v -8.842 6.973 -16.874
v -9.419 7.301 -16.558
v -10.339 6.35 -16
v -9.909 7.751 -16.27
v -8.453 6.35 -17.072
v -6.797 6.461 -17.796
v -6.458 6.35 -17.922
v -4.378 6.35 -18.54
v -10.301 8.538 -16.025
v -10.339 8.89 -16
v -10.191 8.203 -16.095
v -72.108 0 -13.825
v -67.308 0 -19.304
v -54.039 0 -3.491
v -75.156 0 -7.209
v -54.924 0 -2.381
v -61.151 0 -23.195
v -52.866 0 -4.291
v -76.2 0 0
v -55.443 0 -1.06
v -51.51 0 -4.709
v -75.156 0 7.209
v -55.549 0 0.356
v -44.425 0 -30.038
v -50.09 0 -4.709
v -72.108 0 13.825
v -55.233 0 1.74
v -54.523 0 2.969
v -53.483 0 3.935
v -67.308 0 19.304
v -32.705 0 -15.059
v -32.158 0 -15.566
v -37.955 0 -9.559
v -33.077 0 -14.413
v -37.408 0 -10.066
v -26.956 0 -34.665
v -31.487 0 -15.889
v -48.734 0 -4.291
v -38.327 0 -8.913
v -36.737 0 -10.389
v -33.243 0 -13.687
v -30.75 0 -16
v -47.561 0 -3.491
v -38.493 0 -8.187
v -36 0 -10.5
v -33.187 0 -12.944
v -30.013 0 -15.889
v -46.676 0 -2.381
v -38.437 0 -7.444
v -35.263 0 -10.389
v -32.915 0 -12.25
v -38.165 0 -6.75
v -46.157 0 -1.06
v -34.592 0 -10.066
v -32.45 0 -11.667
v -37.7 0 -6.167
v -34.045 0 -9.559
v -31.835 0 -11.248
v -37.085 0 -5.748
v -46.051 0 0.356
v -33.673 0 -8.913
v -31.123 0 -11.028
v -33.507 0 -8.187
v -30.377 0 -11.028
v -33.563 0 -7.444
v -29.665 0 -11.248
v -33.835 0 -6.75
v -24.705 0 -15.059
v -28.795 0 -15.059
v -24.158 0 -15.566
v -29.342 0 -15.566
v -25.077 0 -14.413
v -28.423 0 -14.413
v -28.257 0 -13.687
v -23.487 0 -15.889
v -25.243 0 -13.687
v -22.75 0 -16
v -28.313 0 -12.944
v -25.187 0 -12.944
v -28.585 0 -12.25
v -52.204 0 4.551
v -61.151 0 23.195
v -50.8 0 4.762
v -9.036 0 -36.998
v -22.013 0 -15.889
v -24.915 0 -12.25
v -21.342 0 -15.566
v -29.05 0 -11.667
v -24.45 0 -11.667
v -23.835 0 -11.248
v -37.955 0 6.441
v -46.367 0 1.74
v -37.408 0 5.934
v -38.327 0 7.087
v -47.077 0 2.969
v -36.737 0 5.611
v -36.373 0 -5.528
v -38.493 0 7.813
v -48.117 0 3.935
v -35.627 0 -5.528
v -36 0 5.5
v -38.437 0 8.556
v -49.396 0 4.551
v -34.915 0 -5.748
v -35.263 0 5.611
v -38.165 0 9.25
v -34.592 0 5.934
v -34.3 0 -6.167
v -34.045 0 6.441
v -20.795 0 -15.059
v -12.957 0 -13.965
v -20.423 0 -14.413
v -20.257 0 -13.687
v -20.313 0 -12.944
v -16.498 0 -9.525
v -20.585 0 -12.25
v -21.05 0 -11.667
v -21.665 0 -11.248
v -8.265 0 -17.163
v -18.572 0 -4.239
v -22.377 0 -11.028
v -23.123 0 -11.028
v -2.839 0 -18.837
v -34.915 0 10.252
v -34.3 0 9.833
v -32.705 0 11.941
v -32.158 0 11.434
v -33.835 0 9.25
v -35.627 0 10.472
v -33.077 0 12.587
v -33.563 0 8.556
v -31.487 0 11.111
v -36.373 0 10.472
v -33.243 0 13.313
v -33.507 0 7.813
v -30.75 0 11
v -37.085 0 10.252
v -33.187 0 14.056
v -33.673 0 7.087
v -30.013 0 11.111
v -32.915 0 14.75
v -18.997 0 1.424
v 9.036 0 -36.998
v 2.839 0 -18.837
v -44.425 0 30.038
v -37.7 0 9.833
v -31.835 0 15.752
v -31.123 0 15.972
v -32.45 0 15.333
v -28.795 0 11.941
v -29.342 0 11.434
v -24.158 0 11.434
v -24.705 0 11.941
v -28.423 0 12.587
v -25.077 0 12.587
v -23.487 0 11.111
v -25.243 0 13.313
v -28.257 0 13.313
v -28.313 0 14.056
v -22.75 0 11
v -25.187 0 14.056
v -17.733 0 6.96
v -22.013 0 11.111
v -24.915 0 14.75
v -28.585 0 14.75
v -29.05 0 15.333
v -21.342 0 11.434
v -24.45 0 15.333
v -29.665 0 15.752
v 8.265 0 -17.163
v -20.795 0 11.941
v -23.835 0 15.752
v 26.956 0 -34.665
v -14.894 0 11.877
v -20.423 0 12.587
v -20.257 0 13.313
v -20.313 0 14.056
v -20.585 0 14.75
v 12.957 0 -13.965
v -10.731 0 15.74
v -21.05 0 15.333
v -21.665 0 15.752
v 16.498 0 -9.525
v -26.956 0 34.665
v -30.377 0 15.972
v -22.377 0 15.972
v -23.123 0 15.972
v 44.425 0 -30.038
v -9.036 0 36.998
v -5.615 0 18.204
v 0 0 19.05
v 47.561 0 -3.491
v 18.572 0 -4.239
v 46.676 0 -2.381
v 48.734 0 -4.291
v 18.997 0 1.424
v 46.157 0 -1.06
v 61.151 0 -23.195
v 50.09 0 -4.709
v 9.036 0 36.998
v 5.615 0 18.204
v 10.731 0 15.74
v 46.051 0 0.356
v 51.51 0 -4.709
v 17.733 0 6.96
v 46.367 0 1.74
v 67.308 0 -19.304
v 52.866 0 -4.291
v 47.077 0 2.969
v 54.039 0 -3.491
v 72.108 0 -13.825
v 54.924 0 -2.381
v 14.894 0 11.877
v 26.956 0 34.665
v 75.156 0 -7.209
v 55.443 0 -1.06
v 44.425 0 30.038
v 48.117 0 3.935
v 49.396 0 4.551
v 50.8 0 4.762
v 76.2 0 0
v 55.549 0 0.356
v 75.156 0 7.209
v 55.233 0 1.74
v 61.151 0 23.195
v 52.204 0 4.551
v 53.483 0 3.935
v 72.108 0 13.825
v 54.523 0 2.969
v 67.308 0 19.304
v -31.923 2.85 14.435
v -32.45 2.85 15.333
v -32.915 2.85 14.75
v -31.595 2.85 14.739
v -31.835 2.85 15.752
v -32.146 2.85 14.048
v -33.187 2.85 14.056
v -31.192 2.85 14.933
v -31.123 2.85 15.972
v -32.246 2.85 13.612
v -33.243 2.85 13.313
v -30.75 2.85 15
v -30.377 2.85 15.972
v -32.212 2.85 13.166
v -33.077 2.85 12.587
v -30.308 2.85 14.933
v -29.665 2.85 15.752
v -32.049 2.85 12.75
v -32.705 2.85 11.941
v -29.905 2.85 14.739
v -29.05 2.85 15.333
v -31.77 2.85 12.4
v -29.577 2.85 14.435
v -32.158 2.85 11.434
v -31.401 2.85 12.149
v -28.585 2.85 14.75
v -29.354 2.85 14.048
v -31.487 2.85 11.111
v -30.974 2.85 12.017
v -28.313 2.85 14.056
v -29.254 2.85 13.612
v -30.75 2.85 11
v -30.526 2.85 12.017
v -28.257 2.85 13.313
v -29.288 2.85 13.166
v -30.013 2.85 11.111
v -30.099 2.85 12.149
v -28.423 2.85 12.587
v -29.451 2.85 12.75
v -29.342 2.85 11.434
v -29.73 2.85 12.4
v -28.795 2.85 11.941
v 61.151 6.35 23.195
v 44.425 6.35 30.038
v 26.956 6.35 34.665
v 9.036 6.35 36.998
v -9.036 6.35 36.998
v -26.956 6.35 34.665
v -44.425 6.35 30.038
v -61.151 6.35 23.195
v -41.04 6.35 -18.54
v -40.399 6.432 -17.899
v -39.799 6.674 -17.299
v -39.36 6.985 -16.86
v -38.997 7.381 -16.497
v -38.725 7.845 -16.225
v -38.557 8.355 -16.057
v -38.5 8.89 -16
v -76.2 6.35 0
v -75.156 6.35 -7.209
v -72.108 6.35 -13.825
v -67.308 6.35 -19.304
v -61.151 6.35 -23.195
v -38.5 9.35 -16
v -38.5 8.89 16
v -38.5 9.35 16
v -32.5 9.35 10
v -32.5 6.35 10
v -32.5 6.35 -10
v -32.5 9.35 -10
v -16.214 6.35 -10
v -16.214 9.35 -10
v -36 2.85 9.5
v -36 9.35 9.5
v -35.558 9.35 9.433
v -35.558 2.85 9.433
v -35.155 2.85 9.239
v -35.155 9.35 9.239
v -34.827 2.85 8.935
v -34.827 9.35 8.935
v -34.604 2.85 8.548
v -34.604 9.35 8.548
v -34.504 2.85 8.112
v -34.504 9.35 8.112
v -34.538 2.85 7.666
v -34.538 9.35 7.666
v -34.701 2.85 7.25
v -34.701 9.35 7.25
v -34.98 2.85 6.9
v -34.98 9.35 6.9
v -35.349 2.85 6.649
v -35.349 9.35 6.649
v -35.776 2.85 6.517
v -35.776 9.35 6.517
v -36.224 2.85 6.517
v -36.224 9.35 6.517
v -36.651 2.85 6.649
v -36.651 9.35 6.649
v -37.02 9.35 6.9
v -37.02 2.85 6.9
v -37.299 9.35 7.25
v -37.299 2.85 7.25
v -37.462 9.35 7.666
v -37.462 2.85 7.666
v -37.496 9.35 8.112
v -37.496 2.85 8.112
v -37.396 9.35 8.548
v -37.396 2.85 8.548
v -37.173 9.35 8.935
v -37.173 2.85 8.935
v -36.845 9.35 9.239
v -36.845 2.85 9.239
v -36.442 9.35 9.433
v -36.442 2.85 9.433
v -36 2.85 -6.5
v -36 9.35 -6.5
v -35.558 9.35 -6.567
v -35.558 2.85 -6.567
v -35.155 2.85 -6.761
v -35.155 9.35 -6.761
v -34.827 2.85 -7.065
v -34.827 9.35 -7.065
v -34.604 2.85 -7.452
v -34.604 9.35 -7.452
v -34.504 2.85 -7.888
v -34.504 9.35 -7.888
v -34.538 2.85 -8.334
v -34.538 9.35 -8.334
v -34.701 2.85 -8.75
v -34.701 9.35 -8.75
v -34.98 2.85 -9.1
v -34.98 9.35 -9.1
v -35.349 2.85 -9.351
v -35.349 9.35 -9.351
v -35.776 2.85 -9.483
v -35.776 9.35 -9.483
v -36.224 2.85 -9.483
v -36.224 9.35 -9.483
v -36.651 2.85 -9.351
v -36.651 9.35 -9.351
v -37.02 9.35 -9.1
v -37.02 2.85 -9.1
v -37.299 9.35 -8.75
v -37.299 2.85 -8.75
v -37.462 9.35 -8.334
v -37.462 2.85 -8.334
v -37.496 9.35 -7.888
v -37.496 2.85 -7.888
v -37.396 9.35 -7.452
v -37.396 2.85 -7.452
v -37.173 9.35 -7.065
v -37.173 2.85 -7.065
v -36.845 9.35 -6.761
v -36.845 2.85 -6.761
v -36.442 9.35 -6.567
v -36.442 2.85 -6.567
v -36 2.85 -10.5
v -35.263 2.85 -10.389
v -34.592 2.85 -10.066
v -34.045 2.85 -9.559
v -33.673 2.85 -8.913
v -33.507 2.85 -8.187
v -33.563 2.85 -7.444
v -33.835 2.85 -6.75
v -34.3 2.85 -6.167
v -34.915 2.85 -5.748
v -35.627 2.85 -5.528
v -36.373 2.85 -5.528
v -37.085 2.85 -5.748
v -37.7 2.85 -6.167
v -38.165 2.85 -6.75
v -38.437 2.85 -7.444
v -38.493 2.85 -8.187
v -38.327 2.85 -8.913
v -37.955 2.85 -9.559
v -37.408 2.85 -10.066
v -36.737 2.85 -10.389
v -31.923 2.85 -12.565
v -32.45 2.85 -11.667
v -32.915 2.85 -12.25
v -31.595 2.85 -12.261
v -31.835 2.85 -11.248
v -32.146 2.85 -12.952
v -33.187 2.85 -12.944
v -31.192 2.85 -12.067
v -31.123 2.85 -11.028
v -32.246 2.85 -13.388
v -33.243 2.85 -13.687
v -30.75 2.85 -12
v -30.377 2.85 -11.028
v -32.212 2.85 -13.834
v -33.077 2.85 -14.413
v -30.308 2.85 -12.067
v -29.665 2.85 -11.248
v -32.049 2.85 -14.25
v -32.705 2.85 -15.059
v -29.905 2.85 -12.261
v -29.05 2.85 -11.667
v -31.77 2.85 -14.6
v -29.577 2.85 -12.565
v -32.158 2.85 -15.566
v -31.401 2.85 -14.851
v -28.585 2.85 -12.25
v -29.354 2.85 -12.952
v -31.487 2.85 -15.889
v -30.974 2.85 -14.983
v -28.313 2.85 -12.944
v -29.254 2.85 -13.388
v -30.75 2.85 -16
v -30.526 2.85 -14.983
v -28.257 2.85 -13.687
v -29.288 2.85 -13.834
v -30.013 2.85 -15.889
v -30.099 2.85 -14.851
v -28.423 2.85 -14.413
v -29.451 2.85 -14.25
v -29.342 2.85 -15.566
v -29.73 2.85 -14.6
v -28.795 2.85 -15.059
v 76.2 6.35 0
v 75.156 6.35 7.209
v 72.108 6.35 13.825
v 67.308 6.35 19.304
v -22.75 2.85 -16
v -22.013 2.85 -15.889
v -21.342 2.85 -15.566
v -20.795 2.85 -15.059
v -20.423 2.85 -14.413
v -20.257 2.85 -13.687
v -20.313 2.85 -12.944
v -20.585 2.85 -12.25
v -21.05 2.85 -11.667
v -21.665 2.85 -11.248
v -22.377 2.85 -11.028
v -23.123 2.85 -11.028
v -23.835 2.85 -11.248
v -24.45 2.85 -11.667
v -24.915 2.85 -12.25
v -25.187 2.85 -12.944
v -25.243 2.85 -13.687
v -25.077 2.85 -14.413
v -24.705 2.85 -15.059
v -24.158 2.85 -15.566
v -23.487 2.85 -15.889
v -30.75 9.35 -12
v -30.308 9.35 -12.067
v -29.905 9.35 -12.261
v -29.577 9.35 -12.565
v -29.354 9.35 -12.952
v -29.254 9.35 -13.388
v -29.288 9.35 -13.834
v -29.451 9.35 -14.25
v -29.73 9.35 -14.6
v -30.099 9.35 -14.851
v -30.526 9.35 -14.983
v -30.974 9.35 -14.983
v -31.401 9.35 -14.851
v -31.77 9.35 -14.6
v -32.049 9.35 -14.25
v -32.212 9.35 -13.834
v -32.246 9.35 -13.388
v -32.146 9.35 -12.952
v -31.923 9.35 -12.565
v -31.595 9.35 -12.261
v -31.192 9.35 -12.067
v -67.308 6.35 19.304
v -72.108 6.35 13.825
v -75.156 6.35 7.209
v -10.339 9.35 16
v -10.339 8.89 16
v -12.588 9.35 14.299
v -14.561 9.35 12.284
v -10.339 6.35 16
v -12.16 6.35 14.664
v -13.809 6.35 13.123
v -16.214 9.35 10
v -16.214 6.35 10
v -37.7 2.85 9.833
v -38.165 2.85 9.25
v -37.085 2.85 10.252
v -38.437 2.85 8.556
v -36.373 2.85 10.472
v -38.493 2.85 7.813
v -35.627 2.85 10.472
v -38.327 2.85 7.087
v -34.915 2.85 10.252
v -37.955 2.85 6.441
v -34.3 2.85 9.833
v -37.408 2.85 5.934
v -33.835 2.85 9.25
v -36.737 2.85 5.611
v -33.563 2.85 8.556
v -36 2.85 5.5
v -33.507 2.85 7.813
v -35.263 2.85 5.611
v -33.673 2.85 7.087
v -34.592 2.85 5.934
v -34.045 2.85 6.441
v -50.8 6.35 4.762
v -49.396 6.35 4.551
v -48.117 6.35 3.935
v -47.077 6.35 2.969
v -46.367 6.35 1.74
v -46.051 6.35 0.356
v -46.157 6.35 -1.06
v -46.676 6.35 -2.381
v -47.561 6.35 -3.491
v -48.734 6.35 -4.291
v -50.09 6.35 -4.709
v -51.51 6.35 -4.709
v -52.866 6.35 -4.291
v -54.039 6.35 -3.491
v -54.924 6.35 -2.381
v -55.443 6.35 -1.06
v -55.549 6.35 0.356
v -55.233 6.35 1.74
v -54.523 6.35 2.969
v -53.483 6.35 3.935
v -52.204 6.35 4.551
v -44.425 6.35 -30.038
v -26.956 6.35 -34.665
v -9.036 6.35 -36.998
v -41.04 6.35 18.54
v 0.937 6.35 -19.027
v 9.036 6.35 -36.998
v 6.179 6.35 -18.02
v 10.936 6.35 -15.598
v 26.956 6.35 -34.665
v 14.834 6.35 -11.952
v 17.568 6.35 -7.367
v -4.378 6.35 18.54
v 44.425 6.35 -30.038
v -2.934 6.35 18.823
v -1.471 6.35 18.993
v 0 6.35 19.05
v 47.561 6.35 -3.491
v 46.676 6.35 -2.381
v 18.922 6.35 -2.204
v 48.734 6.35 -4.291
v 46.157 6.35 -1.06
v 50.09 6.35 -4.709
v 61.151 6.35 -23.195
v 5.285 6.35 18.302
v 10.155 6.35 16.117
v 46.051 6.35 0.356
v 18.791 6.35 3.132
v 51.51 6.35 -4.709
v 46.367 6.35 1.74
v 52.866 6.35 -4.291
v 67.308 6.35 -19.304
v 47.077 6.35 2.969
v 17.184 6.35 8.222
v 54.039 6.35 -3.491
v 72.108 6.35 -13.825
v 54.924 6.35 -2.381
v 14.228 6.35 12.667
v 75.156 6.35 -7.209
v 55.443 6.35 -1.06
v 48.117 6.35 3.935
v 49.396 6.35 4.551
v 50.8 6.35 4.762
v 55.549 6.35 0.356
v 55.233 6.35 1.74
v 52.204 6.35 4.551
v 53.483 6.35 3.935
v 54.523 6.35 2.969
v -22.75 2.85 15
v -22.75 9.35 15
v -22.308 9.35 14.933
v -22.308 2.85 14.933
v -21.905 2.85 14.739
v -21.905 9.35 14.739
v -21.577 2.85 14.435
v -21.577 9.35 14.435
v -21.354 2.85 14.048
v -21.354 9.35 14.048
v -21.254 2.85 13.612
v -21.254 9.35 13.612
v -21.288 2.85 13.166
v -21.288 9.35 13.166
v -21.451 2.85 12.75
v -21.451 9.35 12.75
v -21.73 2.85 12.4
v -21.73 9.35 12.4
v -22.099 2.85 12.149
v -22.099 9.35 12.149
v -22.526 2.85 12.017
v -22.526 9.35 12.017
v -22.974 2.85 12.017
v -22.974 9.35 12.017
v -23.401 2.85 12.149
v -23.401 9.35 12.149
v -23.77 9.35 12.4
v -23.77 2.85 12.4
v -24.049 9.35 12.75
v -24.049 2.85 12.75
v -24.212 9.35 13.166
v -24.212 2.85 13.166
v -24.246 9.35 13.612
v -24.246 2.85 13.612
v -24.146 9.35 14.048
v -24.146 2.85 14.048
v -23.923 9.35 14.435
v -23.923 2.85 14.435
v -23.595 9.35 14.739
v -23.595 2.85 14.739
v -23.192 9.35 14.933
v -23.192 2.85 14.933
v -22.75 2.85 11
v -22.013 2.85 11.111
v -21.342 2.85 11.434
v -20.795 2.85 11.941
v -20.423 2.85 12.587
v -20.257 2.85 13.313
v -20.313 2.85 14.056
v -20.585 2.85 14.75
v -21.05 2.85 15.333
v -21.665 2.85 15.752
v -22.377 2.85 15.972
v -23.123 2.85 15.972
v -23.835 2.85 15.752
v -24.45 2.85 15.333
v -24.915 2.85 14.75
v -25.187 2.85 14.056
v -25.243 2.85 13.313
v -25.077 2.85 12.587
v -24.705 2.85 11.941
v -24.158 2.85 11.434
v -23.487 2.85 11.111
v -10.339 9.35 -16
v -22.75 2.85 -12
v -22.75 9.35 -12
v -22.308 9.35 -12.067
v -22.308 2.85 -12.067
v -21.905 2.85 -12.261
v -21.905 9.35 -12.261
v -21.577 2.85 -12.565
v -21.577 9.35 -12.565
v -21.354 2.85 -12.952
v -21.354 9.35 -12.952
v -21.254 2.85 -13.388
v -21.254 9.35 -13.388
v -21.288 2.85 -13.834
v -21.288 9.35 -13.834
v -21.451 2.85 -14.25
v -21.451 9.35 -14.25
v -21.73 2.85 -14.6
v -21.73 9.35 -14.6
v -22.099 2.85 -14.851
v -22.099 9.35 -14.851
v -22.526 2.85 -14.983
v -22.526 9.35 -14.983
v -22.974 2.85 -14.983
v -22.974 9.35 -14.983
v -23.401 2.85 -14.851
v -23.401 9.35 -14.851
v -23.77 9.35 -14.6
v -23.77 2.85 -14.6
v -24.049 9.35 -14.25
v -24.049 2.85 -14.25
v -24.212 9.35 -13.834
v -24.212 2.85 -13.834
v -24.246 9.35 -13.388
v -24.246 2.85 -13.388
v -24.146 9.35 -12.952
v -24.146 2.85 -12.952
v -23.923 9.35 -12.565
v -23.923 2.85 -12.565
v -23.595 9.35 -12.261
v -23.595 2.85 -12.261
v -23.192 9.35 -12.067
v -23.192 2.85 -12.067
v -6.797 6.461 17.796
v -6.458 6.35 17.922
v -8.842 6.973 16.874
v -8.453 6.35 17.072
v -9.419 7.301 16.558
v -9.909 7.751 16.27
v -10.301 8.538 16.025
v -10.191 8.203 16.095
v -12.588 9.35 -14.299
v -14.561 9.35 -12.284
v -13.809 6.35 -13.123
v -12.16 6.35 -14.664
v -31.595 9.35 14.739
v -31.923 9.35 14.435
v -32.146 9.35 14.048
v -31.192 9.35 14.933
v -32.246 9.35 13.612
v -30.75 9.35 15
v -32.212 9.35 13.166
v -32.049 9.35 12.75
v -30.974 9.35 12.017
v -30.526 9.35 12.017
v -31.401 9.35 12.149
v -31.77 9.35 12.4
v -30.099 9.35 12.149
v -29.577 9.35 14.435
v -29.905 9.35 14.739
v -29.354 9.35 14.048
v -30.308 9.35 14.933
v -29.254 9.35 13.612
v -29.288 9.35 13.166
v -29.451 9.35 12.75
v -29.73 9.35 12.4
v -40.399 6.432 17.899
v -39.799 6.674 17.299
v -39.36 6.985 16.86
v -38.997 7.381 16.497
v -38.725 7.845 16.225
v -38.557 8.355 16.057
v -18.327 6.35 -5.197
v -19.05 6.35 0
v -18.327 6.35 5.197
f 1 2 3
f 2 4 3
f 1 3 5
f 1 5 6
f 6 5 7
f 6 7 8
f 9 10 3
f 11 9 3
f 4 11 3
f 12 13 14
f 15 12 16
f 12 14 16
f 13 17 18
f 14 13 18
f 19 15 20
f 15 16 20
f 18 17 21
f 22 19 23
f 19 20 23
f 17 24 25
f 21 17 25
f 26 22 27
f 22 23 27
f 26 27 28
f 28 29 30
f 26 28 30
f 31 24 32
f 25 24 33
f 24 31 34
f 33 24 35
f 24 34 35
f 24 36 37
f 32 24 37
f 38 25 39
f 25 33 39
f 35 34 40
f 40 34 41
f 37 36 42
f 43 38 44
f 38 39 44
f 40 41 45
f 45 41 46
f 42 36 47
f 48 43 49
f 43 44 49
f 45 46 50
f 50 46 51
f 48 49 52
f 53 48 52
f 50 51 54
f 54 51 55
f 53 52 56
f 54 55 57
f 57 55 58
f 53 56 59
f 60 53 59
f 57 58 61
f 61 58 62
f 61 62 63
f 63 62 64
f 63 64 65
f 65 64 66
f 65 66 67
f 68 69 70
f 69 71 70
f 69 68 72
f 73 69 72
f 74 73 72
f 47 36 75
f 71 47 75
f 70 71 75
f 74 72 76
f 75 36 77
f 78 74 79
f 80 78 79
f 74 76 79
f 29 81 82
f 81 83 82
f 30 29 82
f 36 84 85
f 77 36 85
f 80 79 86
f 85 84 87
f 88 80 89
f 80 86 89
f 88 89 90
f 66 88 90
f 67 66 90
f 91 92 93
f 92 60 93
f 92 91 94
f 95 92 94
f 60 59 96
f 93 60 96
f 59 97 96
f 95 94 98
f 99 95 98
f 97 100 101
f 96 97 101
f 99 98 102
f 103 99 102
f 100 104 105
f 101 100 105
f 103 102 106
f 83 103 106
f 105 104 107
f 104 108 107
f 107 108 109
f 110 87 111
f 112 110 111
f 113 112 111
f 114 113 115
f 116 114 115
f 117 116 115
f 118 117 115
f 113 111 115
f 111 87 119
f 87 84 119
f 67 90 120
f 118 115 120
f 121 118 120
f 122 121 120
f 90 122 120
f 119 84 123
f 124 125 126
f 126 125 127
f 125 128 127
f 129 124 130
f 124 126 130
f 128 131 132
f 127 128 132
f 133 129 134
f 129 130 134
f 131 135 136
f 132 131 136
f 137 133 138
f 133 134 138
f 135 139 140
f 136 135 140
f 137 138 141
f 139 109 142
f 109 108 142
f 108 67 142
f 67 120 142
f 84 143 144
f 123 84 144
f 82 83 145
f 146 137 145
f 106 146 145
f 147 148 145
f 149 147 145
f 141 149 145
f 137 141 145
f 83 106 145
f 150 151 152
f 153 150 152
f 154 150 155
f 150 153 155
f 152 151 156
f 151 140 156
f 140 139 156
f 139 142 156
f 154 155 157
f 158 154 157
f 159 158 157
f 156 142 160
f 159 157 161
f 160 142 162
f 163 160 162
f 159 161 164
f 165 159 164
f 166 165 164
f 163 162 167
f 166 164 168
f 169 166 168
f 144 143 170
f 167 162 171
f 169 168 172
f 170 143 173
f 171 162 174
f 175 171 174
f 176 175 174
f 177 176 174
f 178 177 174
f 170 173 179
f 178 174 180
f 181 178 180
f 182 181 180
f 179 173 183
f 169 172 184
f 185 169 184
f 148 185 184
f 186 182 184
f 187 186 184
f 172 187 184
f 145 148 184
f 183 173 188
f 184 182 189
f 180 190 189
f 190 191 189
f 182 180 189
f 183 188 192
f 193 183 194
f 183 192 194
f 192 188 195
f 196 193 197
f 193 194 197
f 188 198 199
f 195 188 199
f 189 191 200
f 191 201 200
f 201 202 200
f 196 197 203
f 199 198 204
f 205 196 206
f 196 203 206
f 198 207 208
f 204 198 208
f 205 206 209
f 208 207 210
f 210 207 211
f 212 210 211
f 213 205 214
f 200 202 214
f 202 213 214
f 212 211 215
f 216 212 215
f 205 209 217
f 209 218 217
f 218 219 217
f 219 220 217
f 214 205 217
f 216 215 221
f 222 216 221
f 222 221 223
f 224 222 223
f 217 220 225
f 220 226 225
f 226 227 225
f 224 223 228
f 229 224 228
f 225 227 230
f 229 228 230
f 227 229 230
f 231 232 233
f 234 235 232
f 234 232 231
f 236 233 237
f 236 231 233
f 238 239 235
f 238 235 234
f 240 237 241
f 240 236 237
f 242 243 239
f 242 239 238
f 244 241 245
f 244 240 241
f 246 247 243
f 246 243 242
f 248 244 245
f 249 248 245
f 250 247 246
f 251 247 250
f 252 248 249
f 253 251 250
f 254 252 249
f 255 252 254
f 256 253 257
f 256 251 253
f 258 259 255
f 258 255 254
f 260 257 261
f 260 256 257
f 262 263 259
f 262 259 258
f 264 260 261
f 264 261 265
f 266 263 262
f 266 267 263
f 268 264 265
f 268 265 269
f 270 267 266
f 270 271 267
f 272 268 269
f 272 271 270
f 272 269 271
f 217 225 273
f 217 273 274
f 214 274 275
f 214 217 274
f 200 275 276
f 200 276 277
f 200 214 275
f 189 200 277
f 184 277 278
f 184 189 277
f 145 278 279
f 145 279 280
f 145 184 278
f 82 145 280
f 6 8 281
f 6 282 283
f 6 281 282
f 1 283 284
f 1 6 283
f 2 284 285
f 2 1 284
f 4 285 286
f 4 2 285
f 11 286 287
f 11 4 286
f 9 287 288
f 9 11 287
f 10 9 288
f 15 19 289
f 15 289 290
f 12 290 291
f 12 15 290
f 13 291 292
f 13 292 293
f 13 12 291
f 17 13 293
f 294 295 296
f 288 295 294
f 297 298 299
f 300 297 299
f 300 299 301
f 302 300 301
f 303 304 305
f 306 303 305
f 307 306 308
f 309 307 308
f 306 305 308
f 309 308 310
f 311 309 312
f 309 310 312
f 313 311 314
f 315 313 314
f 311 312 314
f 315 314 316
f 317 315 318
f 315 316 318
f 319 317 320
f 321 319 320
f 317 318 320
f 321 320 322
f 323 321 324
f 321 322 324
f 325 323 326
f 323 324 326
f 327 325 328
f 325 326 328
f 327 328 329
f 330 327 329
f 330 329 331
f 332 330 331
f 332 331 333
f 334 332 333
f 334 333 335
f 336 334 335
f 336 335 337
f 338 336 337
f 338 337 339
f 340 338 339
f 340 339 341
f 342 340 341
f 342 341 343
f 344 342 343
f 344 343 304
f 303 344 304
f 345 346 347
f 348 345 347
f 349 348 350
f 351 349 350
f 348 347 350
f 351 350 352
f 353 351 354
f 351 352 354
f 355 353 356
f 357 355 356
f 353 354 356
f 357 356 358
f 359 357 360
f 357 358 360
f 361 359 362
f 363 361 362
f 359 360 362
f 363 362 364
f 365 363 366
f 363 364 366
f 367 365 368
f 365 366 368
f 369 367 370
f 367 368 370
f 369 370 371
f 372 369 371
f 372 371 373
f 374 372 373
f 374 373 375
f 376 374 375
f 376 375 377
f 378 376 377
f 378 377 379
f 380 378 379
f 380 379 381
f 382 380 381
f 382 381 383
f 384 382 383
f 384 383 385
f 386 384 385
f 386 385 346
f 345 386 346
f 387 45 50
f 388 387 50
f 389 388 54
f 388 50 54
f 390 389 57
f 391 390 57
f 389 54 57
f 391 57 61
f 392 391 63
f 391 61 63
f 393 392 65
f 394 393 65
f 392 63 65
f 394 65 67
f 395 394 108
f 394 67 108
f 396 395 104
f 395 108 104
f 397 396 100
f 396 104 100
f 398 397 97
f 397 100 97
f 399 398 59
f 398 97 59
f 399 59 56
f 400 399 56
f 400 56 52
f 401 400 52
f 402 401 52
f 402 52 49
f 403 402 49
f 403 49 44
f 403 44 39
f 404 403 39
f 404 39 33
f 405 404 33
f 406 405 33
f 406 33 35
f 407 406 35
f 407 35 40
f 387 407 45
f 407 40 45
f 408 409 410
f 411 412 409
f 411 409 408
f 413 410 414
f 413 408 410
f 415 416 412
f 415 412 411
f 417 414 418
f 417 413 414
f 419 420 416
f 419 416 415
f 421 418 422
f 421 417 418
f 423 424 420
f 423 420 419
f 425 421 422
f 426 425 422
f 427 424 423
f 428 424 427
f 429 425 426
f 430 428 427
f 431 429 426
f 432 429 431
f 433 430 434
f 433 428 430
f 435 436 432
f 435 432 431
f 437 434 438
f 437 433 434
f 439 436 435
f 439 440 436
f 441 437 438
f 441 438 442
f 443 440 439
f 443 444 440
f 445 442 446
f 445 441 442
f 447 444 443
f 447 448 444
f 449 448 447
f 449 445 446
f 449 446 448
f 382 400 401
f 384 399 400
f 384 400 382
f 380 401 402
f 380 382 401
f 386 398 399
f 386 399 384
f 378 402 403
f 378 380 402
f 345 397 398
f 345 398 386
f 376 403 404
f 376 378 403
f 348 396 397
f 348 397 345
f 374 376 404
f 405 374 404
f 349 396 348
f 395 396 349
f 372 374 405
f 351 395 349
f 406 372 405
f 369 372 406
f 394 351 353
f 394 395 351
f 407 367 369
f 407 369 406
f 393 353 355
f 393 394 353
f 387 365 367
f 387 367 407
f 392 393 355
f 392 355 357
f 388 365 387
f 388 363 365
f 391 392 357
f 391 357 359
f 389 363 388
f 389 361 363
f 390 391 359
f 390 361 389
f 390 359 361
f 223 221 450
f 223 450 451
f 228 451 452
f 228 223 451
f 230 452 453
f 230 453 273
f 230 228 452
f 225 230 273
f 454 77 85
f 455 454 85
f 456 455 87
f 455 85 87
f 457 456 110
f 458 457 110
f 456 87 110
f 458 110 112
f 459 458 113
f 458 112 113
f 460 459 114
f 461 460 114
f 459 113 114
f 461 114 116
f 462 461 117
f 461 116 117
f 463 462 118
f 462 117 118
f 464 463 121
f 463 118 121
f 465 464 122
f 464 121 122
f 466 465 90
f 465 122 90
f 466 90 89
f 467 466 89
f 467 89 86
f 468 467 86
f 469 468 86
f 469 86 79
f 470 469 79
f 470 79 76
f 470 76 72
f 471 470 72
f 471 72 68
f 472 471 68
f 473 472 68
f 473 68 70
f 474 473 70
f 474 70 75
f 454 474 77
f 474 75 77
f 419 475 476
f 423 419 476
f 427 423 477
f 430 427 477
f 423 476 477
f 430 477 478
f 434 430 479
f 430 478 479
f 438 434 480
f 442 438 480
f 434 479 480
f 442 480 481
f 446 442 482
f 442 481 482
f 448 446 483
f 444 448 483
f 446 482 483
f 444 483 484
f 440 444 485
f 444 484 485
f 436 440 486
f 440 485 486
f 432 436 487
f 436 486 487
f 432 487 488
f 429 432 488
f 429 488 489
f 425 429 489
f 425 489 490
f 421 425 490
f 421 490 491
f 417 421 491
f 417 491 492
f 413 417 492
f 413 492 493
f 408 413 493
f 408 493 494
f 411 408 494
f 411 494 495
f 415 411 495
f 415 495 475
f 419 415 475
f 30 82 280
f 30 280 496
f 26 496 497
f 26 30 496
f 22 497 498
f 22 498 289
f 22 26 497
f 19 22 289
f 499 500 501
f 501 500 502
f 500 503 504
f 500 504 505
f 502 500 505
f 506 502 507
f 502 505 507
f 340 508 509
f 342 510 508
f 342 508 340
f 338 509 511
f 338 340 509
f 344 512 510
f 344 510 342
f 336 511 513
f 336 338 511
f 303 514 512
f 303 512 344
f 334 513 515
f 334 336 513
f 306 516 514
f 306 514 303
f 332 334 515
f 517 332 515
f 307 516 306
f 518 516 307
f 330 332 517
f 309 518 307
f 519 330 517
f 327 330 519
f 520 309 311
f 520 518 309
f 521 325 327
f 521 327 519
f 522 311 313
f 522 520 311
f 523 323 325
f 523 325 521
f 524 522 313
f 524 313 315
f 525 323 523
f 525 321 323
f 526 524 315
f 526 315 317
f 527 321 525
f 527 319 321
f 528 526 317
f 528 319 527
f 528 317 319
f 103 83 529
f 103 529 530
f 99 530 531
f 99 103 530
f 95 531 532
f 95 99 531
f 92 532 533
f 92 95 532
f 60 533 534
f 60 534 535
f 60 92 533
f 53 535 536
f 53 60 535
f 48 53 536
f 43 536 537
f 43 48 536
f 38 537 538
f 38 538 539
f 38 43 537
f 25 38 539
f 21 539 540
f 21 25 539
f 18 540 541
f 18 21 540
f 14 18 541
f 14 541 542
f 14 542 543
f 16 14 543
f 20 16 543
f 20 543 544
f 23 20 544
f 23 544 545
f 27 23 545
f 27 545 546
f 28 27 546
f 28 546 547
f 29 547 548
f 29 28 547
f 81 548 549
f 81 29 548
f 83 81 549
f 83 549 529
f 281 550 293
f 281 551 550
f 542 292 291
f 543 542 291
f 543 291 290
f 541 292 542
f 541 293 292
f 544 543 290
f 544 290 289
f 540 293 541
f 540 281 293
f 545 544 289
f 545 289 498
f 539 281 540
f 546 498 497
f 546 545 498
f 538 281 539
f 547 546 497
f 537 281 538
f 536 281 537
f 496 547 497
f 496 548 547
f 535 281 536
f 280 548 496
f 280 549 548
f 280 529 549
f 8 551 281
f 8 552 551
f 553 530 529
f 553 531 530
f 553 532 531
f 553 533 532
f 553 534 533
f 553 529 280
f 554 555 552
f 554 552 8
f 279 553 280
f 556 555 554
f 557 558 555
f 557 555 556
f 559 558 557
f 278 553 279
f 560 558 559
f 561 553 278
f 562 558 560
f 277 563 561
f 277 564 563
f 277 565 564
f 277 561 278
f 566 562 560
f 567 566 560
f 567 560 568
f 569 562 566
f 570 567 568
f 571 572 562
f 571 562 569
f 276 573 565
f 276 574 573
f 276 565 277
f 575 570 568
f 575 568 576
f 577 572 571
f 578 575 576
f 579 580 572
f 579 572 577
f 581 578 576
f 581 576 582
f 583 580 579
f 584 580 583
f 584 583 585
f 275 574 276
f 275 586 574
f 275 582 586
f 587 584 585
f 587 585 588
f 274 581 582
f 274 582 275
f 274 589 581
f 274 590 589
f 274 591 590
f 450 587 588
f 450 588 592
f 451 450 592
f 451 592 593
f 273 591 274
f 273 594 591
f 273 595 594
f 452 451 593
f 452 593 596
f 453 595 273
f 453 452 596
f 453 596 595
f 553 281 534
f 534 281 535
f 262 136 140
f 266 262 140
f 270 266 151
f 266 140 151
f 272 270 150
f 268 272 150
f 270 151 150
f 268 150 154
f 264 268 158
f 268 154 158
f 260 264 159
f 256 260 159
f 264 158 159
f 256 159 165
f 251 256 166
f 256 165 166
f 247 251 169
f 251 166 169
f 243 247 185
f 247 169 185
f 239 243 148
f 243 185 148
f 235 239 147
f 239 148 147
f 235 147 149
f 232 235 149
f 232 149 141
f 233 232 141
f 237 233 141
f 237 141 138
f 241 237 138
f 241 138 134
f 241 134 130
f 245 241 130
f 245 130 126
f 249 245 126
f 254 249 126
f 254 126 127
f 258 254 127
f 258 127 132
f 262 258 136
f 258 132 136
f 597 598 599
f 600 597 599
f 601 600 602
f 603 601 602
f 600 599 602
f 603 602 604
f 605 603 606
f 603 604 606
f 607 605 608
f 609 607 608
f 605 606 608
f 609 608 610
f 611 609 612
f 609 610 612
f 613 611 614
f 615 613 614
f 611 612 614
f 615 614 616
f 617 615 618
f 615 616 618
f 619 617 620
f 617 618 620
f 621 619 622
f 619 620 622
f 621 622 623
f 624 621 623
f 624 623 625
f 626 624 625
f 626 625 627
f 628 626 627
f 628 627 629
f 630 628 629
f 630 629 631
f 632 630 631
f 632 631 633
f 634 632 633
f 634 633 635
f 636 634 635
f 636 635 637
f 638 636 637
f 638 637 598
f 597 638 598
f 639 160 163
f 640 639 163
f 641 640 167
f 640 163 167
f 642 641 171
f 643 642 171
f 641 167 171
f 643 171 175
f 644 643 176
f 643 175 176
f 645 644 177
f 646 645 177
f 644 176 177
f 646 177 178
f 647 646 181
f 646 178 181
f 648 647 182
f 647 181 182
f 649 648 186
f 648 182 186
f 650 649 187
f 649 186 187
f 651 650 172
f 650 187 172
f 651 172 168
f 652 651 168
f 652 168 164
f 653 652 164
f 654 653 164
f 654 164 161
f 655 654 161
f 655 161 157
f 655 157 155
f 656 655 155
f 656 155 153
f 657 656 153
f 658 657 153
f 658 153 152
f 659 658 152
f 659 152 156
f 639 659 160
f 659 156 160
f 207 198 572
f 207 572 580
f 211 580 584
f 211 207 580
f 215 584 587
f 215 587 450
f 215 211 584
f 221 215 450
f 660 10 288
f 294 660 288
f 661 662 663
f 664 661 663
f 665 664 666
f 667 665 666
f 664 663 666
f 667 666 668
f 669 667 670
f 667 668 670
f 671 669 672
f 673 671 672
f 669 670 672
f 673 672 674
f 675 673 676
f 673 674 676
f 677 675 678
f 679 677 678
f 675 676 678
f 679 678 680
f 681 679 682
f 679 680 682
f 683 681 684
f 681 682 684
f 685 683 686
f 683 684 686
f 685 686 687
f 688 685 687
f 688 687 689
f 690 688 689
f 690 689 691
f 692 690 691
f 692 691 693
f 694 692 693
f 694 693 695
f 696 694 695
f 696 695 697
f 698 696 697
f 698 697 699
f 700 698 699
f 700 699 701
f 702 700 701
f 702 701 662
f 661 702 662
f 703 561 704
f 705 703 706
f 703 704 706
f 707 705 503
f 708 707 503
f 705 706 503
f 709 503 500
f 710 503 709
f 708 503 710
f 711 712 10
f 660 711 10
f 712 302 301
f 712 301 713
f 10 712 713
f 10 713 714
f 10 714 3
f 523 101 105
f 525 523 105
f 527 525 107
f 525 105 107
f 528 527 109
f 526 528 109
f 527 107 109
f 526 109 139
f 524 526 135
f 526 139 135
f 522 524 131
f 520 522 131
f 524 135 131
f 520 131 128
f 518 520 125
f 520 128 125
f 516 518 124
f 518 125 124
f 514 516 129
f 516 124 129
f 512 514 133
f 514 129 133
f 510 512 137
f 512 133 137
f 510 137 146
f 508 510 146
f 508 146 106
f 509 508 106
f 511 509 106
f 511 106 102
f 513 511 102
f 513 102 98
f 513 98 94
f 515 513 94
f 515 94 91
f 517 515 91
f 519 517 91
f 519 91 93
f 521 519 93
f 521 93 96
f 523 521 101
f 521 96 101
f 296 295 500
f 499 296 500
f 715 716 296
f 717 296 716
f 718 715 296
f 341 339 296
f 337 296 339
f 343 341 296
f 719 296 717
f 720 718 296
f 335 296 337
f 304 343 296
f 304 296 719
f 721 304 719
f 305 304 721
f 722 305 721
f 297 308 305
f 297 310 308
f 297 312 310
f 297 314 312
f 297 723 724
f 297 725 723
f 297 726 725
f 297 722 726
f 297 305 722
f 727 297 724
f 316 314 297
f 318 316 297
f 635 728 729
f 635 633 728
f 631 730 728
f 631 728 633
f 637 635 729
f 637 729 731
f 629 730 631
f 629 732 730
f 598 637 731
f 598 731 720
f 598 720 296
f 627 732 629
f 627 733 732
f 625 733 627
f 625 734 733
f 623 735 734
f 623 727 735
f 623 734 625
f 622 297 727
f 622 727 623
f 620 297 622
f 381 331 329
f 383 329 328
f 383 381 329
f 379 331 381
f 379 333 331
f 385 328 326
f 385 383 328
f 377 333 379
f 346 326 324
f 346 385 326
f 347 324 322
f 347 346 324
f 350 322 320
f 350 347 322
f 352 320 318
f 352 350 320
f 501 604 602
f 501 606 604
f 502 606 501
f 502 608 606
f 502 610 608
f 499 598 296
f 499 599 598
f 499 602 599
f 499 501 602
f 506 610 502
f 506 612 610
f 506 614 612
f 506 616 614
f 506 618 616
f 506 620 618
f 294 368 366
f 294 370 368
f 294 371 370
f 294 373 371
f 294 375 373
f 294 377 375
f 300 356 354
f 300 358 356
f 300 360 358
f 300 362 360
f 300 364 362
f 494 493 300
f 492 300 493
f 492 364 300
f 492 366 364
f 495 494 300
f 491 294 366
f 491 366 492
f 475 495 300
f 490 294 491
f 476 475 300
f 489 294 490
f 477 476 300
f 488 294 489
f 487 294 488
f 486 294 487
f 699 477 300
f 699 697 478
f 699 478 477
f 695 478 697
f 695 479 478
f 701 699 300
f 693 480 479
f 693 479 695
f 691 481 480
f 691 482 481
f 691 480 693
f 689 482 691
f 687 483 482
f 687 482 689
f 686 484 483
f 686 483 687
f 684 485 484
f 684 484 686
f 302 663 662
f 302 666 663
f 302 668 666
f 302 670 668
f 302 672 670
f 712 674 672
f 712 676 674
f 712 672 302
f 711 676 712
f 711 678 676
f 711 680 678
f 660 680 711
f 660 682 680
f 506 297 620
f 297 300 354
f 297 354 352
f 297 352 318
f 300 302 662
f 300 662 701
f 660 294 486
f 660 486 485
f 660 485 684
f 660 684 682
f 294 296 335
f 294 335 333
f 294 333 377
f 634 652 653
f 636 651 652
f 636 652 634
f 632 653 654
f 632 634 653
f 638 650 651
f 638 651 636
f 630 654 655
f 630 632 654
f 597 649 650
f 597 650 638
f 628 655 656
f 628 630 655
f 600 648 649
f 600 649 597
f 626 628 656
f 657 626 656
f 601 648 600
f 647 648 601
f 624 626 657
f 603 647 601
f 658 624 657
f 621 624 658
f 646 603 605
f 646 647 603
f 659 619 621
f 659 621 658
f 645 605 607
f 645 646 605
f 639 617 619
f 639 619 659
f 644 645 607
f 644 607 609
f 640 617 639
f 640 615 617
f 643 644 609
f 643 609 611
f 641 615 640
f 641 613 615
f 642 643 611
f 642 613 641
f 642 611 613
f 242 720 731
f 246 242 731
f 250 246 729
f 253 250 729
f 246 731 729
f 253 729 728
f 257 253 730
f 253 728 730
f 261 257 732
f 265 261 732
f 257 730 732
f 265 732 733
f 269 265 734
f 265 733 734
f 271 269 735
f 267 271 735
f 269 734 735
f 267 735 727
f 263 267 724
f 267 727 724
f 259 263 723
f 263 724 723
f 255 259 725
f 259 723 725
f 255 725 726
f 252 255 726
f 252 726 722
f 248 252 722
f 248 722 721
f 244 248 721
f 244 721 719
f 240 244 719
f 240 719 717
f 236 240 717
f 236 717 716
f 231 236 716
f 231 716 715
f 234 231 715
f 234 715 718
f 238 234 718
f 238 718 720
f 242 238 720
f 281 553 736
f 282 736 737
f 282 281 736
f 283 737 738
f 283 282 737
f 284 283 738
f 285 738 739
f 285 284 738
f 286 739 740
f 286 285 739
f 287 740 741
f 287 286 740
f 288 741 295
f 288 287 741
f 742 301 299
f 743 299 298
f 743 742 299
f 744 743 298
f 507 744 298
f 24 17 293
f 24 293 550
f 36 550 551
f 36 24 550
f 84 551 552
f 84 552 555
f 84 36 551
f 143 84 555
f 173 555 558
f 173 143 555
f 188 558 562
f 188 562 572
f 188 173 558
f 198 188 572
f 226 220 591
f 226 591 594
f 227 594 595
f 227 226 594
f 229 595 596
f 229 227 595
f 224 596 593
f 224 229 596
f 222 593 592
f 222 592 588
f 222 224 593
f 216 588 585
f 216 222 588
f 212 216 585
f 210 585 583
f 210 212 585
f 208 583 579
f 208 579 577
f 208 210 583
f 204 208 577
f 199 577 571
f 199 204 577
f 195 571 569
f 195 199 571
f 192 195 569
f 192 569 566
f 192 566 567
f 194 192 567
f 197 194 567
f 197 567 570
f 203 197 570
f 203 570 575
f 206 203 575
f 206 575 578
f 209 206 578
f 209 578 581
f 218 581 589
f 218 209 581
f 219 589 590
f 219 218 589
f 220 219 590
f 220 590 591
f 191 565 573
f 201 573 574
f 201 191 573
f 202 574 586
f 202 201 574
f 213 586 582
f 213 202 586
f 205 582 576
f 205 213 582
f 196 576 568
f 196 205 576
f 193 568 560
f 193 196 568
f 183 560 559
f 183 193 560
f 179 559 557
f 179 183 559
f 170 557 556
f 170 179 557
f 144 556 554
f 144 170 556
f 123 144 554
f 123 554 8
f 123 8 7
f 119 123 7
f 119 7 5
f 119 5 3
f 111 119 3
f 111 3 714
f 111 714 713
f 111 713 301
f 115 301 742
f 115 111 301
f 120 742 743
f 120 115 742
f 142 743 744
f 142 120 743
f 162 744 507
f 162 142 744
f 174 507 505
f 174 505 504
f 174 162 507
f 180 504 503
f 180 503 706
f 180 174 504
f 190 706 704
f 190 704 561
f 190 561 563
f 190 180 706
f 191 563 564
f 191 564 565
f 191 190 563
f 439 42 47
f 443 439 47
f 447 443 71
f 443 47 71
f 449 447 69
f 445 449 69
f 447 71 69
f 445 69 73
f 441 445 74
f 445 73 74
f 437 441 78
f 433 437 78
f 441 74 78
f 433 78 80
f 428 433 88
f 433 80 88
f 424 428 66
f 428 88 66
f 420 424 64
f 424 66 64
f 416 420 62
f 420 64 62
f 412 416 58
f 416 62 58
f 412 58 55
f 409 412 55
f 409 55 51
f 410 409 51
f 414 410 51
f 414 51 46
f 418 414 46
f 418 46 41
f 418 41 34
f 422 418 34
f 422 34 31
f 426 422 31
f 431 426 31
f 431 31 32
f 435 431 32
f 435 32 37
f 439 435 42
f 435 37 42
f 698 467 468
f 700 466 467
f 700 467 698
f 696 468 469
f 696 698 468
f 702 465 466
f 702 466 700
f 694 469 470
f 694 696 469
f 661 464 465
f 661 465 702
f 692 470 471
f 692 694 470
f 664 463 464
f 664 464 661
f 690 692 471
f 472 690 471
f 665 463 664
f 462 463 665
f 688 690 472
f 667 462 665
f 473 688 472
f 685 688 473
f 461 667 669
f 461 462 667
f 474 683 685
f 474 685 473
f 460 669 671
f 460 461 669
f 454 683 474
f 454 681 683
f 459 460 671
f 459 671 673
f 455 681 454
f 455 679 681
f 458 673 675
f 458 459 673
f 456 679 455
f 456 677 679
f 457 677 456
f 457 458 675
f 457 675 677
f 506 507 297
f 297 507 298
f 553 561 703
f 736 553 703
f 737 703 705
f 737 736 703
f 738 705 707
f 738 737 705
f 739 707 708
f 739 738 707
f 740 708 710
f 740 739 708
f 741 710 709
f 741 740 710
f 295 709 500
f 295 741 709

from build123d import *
from build123d.topology import SkipClean

# Parameters (mm, degrees)
SKETCH1_R           = 76.2
BOSS_EXTRUDE1_DEPTH = 6.35
CUT_EXTRUDE2_START  = -6.35
SKETCH2_R           = 4.7625
SKETCH2_R_2         = 19.05
CUT_EXTRUDE2_DEPTH  = 6.35
BOSS_EXTRUDE2_DEPTH = 3
SKETCH4_R           = 1.5
SKETCH4_R_2         = 1.25
CUT_EXTRUDE3_DEPTH  = 86.348763
FILLET1_R           = 2.54
SKETCH5_R           = 2.5
CUT_EXTRUDE4_DEPTH  = 2.85


with BuildPart() as part:
    # Sketch1 → Boss-Extrude1 (new body)
    with BuildSketch(Plane(origin=(0, 0, 0), x_dir=(1, 0, 0), z_dir=(0, 1, 0))):
        with Locations(Location((0, 0, 0), (0, 0, 270))):
            Circle(SKETCH1_R)
    extrude(amount=BOSS_EXTRUDE1_DEPTH)

    # Sketch2 → Cut-Extrude2 (cut)
    with BuildSketch(Plane(origin=(0, 6.35, 0), x_dir=(1, 0, 0), z_dir=(0, 1, 0)).offset(CUT_EXTRUDE2_START)):
        with BuildLine():
            ThreePointArc((61.150771, -23.195291), (0, -37.290064), (-61.150771, -23.195291))
            ThreePointArc((-61.150771, -23.195291), (-72.108092, -13.824804), (-76.2, 0))
            ThreePointArc((-76.2, 0), (0, -76.2), (76.2, 0))
            ThreePointArc((76.2, 0), (72.108092, -13.824804), (61.150771, -23.195291))
        make_face()
        with BuildLine():
            ThreePointArc((-61.150771, 23.195291), (0, 37.290064), (61.150771, 23.195291))
            ThreePointArc((61.150771, 23.195291), (72.108092, 13.824804), (76.2, 0))
            ThreePointArc((76.2, 0), (0, 76.2), (-76.2, 0))
            ThreePointArc((-76.2, 0), (-72.108092, 13.824804), (-61.150771, 23.195291))
        make_face()
        with Locations(Location((-50.8, 0, 0), (0, 0, 270))):
            Circle(SKETCH2_R)
        with Locations(Location((50.8, 0, 0), (0, 0, 270))):
            Circle(SKETCH2_R)
        with Locations(Location((0, 0, 0), (0, 0, 270))):
            Circle(SKETCH2_R_2)
    extrude(amount=CUT_EXTRUDE2_DEPTH, mode=Mode.SUBTRACT)

    # Sketch3 → Boss-Extrude2 (add)
    with SkipClean():  # the faces are left unmerged after this step: merging them gives an invalid solid
        with BuildSketch(Plane(origin=(0, 6.35, 0), x_dir=(1, 0, 0), z_dir=(0, 1, 0))):
            with BuildLine():
                Line((-38.5, 4.75), (-38.5, -4.75))
                Line((-38.5, -4.75), (-38.5, -11.25))
                Line((-38.5, -11.25), (-38.5, -16))
                Line((-38.5, -16), (-18, -16))
                Line((-18, -16), (-11.5, -16))
                Line((-11.5, -16), (-10.339367, -16))
                ThreePointArc((-10.339367, -16), (-13.611535, -13.327739), (-16.214268, -10))
                Line((-16.214268, -10), (-31.096327, -10))
                Line((-31.096327, -10), (-32.5, -10))
                Line((-32.5, -10), (-32.5, -8.522949))
                Line((-32.5, -8.522949), (-32.5, 8.425596))
                Line((-32.5, 8.425596), (-32.5, 10))
                Line((-32.5, 10), (-31.027855, 10))
                Line((-31.027855, 10), (-16.214268, 10))
                ThreePointArc((-16.214268, 10), (-13.611535, 13.327739), (-10.339367, 16))
                Line((-10.339367, 16), (-11.5, 16))
                Line((-11.5, 16), (-18, 16))
                Line((-18, 16), (-38.5, 16))
                Line((-38.5, 16), (-38.5, 11.25))
                Line((-38.5, 11.25), (-38.5, 4.75))
            make_face()
        extrude(amount=BOSS_EXTRUDE2_DEPTH)

    # Sketch4 → Cut-Extrude3 (cut, through all)
    # profile 1 of 12: a face of its own
    with SkipClean():  # the faces are left unmerged after this step: merging them gives an invalid solid
        with BuildSketch(Plane(origin=(0, 9.35, 0), x_dir=(1, 0, 0), z_dir=(0, 1, 0))):
            with Locations(Location((-30.75, -13.5, 0), (0, 0, 270))):
                Circle(SKETCH4_R)
            with Locations((-30.75, -13.5)):
                Circle(SKETCH4_R_2, mode=Mode.SUBTRACT)
        # profile 2 of 12: a face of its own
        with BuildSketch(Plane(origin=(0, 9.35, 0), x_dir=(1, 0, 0), z_dir=(0, 1, 0))):
            with Locations((-30.75, -13.5)):
                Circle(SKETCH4_R_2)
        # profile 3 of 12: a face of its own
        with BuildSketch(Plane(origin=(0, 9.35, 0), x_dir=(1, 0, 0), z_dir=(0, 1, 0))):
            with Locations(Location((-22.75, -13.5, 0), (0, 0, 270))):
                Circle(SKETCH4_R)
            with Locations((-22.75, -13.5)):
                Circle(SKETCH4_R_2, mode=Mode.SUBTRACT)
        # profile 4 of 12: a face of its own
        with BuildSketch(Plane(origin=(0, 9.35, 0), x_dir=(1, 0, 0), z_dir=(0, 1, 0))):
            with Locations((-22.75, -13.5)):
                Circle(SKETCH4_R_2)
        # profile 5 of 12: a face of its own
        with BuildSketch(Plane(origin=(0, 9.35, 0), x_dir=(1, 0, 0), z_dir=(0, 1, 0))):
            with Locations(Location((-36, -8, 0), (0, 0, 270))):
                Circle(SKETCH4_R)
            with Locations((-36, -8)):
                Circle(SKETCH4_R_2, mode=Mode.SUBTRACT)
        # profile 6 of 12: a face of its own
        with BuildSketch(Plane(origin=(0, 9.35, 0), x_dir=(1, 0, 0), z_dir=(0, 1, 0))):
            with Locations((-36, -8)):
                Circle(SKETCH4_R_2)
        # profile 7 of 12: a face of its own
        with BuildSketch(Plane(origin=(0, 9.35, 0), x_dir=(1, 0, 0), z_dir=(0, 1, 0))):
            with Locations(Location((-36, 8, 0), (0, 0, 270))):
                Circle(SKETCH4_R)
            with Locations((-36, 8)):
                Circle(SKETCH4_R_2, mode=Mode.SUBTRACT)
        # profile 8 of 12: a face of its own
        with BuildSketch(Plane(origin=(0, 9.35, 0), x_dir=(1, 0, 0), z_dir=(0, 1, 0))):
            with Locations((-36, 8)):
                Circle(SKETCH4_R_2)
        # profile 9 of 12: a face of its own
        with BuildSketch(Plane(origin=(0, 9.35, 0), x_dir=(1, 0, 0), z_dir=(0, 1, 0))):
            with Locations(Location((-30.75, 13.5, 0), (0, 0, 270))):
                Circle(SKETCH4_R)
            with Locations((-30.75, 13.5)):
                Circle(SKETCH4_R_2, mode=Mode.SUBTRACT)
        # profile 10 of 12: a face of its own
        with BuildSketch(Plane(origin=(0, 9.35, 0), x_dir=(1, 0, 0), z_dir=(0, 1, 0))):
            with Locations((-30.75, 13.5)):
                Circle(SKETCH4_R_2)
        # profile 11 of 12: a face of its own
        with BuildSketch(Plane(origin=(0, 9.35, 0), x_dir=(1, 0, 0), z_dir=(0, 1, 0))):
            with Locations(Location((-22.75, 13.5, 0), (0, 0, 270))):
                Circle(SKETCH4_R)
            with Locations((-22.75, 13.5)):
                Circle(SKETCH4_R_2, mode=Mode.SUBTRACT)
        # profile 12 of 12: a face of its own
        with BuildSketch(Plane(origin=(0, 9.35, 0), x_dir=(1, 0, 0), z_dir=(0, 1, 0))):
            with Locations((-22.75, 13.5)):
                Circle(SKETCH4_R_2)
        extrude(amount=-CUT_EXTRUDE3_DEPTH, mode=Mode.SUBTRACT)

    # Fillet1
    # the kernel refuses this fillet: 2.54 mm, written as the material it adds along each edge
    with BuildSketch(Plane(origin=(-3.989367, 6.35, -16), x_dir=(0, 0, -1), z_dir=(-1, 0, 0))) as fillet1_piece_1_section:
        with BuildLine():
            CenterArc((FILLET1_R, -FILLET1_R), FILLET1_R, 90, 90)
            Line((0, -FILLET1_R), (0, 0))
            Line((0, 0), (FILLET1_R, 0))
        make_face()
    fillet1_piece_1 = extrude(amount=34.510633, mode=Mode.PRIVATE)
    fillet1_piece_1 = fillet1_piece_1 - Plane(origin=(0, 6.913548, 0), x_dir=(0, 0, 1), z_dir=(0, -1, 0)) * Cylinder(19.05, 80, mode=Mode.PRIVATE)
    add(fillet1_piece_1)
    with BuildSketch(Plane(origin=(-38.5, 6.35, 16), x_dir=(0, 0, 1), z_dir=(1, 0, 0))) as fillet1_piece_2_section:
        with BuildLine():
            CenterArc((FILLET1_R, -FILLET1_R), FILLET1_R, 90, 90)
            Line((0, -FILLET1_R), (0, 0))
            Line((0, 0), (FILLET1_R, 0))
        make_face()
    fillet1_piece_2 = extrude(amount=34.510633, mode=Mode.PRIVATE)
    fillet1_piece_2 = fillet1_piece_2 - Plane(origin=(0, 6.913549, 0), x_dir=(0, 0, 1), z_dir=(0, -1, 0)) * Cylinder(19.05, 80, mode=Mode.PRIVATE)
    add(fillet1_piece_2)
    with BuildSketch(Plane(origin=(-38.5, 6.35, -16), x_dir=(-1, 0, 0), z_dir=(0, 0, 1))) as fillet1_piece_3:
        with BuildLine():
            CenterArc((FILLET1_R, -FILLET1_R), FILLET1_R, 90, 90)
            Line((0, -FILLET1_R), (0, 0))
            Line((0, 0), (FILLET1_R, 0))
        make_face()
    extrude(amount=32)
    with BuildSketch(Plane(origin=(-3.989367, 6.35, -16), x_dir=(0, 0, -1), z_dir=(-1, 0, 0))) as fillet1_piece_4a_section:
        with BuildLine():
            CenterArc((FILLET1_R, -FILLET1_R), FILLET1_R, 90, 90)
            Line((0, -FILLET1_R), (0, 0))
            Line((0, 0), (FILLET1_R, 0))
        make_face()
    fillet1_piece_4a = extrude(amount=40.860633, mode=Mode.PRIVATE)
    fillet1_piece_4a = split(fillet1_piece_4a, bisect_by=Plane(origin=(-38.5, 6.925044, -16.575044), z_dir=(-1, 0, 0)), keep=Keep.TOP, mode=Mode.PRIVATE)
    with BuildSketch(Plane(origin=(-38.5, 6.35, -22.35), x_dir=(-1, 0, 0), z_dir=(0, 0, 1))) as fillet1_piece_4b_section:
        with BuildLine():
            CenterArc((FILLET1_R, -FILLET1_R), FILLET1_R, 90, 90)
            Line((0, -FILLET1_R), (0, 0))
            Line((0, 0), (FILLET1_R, 0))
        make_face()
    fillet1_piece_4b = extrude(amount=38.35, mode=Mode.PRIVATE)
    fillet1_piece_4b = split(fillet1_piece_4b, bisect_by=Plane(origin=(-39.075044, 6.925044, -16), z_dir=(0, 0, -1)), keep=Keep.TOP, mode=Mode.PRIVATE)
    fillet1_piece_4 = fillet1_piece_4a & fillet1_piece_4b
    add(fillet1_piece_4)
    with BuildSketch(Plane(origin=(-38.5, 6.35, -16), x_dir=(-1, 0, 0), z_dir=(0, 0, 1))) as fillet1_piece_5a_section:
        with BuildLine():
            CenterArc((FILLET1_R, -FILLET1_R), FILLET1_R, 90, 90)
            Line((0, -FILLET1_R), (0, 0))
            Line((0, 0), (FILLET1_R, 0))
        make_face()
    fillet1_piece_5a = extrude(amount=38.35, mode=Mode.PRIVATE)
    fillet1_piece_5a = split(fillet1_piece_5a, bisect_by=Plane(origin=(-39.075044, 6.925044, 16), z_dir=(0, 0, 1)), keep=Keep.TOP, mode=Mode.PRIVATE)
    with BuildSketch(Plane(origin=(-44.85, 6.35, 16), x_dir=(0, 0, 1), z_dir=(1, 0, 0))) as fillet1_piece_5b_section:
        with BuildLine():
            CenterArc((FILLET1_R, -FILLET1_R), FILLET1_R, 90, 90)
            Line((0, -FILLET1_R), (0, 0))
            Line((0, 0), (FILLET1_R, 0))
        make_face()
    fillet1_piece_5b = extrude(amount=40.860633, mode=Mode.PRIVATE)
    fillet1_piece_5b = split(fillet1_piece_5b, bisect_by=Plane(origin=(-38.5, 6.925044, 16.575044), z_dir=(-1, 0, 0)), keep=Keep.TOP, mode=Mode.PRIVATE)
    fillet1_piece_5 = fillet1_piece_5a & fillet1_piece_5b
    add(fillet1_piece_5)

    # Sketch5 → Cut-Extrude4 (cut)
    with BuildSketch(Plane.XZ):
        with Locations(Location((-22.75, 13.5, 0), (0, 0, 270))):
            Circle(SKETCH5_R)
        with Locations(Location((-30.75, 13.5, 0), (0, 0, 270))):
            Circle(SKETCH5_R)
        with Locations(Location((-36, 8, 0), (0, 0, 270))):
            Circle(SKETCH5_R)
        with Locations(Location((-36, -8, 0), (0, 0, 270))):
            Circle(SKETCH5_R)
        with Locations(Location((-30.75, -13.5, 0), (0, 0, 270))):
            Circle(SKETCH5_R)
        with Locations(Location((-22.75, -13.5, 0), (0, 0, 270))):
            Circle(SKETCH5_R)
    extrude(amount=-CUT_EXTRUDE4_DEPTH, mode=Mode.SUBTRACT)


solid = part.part
